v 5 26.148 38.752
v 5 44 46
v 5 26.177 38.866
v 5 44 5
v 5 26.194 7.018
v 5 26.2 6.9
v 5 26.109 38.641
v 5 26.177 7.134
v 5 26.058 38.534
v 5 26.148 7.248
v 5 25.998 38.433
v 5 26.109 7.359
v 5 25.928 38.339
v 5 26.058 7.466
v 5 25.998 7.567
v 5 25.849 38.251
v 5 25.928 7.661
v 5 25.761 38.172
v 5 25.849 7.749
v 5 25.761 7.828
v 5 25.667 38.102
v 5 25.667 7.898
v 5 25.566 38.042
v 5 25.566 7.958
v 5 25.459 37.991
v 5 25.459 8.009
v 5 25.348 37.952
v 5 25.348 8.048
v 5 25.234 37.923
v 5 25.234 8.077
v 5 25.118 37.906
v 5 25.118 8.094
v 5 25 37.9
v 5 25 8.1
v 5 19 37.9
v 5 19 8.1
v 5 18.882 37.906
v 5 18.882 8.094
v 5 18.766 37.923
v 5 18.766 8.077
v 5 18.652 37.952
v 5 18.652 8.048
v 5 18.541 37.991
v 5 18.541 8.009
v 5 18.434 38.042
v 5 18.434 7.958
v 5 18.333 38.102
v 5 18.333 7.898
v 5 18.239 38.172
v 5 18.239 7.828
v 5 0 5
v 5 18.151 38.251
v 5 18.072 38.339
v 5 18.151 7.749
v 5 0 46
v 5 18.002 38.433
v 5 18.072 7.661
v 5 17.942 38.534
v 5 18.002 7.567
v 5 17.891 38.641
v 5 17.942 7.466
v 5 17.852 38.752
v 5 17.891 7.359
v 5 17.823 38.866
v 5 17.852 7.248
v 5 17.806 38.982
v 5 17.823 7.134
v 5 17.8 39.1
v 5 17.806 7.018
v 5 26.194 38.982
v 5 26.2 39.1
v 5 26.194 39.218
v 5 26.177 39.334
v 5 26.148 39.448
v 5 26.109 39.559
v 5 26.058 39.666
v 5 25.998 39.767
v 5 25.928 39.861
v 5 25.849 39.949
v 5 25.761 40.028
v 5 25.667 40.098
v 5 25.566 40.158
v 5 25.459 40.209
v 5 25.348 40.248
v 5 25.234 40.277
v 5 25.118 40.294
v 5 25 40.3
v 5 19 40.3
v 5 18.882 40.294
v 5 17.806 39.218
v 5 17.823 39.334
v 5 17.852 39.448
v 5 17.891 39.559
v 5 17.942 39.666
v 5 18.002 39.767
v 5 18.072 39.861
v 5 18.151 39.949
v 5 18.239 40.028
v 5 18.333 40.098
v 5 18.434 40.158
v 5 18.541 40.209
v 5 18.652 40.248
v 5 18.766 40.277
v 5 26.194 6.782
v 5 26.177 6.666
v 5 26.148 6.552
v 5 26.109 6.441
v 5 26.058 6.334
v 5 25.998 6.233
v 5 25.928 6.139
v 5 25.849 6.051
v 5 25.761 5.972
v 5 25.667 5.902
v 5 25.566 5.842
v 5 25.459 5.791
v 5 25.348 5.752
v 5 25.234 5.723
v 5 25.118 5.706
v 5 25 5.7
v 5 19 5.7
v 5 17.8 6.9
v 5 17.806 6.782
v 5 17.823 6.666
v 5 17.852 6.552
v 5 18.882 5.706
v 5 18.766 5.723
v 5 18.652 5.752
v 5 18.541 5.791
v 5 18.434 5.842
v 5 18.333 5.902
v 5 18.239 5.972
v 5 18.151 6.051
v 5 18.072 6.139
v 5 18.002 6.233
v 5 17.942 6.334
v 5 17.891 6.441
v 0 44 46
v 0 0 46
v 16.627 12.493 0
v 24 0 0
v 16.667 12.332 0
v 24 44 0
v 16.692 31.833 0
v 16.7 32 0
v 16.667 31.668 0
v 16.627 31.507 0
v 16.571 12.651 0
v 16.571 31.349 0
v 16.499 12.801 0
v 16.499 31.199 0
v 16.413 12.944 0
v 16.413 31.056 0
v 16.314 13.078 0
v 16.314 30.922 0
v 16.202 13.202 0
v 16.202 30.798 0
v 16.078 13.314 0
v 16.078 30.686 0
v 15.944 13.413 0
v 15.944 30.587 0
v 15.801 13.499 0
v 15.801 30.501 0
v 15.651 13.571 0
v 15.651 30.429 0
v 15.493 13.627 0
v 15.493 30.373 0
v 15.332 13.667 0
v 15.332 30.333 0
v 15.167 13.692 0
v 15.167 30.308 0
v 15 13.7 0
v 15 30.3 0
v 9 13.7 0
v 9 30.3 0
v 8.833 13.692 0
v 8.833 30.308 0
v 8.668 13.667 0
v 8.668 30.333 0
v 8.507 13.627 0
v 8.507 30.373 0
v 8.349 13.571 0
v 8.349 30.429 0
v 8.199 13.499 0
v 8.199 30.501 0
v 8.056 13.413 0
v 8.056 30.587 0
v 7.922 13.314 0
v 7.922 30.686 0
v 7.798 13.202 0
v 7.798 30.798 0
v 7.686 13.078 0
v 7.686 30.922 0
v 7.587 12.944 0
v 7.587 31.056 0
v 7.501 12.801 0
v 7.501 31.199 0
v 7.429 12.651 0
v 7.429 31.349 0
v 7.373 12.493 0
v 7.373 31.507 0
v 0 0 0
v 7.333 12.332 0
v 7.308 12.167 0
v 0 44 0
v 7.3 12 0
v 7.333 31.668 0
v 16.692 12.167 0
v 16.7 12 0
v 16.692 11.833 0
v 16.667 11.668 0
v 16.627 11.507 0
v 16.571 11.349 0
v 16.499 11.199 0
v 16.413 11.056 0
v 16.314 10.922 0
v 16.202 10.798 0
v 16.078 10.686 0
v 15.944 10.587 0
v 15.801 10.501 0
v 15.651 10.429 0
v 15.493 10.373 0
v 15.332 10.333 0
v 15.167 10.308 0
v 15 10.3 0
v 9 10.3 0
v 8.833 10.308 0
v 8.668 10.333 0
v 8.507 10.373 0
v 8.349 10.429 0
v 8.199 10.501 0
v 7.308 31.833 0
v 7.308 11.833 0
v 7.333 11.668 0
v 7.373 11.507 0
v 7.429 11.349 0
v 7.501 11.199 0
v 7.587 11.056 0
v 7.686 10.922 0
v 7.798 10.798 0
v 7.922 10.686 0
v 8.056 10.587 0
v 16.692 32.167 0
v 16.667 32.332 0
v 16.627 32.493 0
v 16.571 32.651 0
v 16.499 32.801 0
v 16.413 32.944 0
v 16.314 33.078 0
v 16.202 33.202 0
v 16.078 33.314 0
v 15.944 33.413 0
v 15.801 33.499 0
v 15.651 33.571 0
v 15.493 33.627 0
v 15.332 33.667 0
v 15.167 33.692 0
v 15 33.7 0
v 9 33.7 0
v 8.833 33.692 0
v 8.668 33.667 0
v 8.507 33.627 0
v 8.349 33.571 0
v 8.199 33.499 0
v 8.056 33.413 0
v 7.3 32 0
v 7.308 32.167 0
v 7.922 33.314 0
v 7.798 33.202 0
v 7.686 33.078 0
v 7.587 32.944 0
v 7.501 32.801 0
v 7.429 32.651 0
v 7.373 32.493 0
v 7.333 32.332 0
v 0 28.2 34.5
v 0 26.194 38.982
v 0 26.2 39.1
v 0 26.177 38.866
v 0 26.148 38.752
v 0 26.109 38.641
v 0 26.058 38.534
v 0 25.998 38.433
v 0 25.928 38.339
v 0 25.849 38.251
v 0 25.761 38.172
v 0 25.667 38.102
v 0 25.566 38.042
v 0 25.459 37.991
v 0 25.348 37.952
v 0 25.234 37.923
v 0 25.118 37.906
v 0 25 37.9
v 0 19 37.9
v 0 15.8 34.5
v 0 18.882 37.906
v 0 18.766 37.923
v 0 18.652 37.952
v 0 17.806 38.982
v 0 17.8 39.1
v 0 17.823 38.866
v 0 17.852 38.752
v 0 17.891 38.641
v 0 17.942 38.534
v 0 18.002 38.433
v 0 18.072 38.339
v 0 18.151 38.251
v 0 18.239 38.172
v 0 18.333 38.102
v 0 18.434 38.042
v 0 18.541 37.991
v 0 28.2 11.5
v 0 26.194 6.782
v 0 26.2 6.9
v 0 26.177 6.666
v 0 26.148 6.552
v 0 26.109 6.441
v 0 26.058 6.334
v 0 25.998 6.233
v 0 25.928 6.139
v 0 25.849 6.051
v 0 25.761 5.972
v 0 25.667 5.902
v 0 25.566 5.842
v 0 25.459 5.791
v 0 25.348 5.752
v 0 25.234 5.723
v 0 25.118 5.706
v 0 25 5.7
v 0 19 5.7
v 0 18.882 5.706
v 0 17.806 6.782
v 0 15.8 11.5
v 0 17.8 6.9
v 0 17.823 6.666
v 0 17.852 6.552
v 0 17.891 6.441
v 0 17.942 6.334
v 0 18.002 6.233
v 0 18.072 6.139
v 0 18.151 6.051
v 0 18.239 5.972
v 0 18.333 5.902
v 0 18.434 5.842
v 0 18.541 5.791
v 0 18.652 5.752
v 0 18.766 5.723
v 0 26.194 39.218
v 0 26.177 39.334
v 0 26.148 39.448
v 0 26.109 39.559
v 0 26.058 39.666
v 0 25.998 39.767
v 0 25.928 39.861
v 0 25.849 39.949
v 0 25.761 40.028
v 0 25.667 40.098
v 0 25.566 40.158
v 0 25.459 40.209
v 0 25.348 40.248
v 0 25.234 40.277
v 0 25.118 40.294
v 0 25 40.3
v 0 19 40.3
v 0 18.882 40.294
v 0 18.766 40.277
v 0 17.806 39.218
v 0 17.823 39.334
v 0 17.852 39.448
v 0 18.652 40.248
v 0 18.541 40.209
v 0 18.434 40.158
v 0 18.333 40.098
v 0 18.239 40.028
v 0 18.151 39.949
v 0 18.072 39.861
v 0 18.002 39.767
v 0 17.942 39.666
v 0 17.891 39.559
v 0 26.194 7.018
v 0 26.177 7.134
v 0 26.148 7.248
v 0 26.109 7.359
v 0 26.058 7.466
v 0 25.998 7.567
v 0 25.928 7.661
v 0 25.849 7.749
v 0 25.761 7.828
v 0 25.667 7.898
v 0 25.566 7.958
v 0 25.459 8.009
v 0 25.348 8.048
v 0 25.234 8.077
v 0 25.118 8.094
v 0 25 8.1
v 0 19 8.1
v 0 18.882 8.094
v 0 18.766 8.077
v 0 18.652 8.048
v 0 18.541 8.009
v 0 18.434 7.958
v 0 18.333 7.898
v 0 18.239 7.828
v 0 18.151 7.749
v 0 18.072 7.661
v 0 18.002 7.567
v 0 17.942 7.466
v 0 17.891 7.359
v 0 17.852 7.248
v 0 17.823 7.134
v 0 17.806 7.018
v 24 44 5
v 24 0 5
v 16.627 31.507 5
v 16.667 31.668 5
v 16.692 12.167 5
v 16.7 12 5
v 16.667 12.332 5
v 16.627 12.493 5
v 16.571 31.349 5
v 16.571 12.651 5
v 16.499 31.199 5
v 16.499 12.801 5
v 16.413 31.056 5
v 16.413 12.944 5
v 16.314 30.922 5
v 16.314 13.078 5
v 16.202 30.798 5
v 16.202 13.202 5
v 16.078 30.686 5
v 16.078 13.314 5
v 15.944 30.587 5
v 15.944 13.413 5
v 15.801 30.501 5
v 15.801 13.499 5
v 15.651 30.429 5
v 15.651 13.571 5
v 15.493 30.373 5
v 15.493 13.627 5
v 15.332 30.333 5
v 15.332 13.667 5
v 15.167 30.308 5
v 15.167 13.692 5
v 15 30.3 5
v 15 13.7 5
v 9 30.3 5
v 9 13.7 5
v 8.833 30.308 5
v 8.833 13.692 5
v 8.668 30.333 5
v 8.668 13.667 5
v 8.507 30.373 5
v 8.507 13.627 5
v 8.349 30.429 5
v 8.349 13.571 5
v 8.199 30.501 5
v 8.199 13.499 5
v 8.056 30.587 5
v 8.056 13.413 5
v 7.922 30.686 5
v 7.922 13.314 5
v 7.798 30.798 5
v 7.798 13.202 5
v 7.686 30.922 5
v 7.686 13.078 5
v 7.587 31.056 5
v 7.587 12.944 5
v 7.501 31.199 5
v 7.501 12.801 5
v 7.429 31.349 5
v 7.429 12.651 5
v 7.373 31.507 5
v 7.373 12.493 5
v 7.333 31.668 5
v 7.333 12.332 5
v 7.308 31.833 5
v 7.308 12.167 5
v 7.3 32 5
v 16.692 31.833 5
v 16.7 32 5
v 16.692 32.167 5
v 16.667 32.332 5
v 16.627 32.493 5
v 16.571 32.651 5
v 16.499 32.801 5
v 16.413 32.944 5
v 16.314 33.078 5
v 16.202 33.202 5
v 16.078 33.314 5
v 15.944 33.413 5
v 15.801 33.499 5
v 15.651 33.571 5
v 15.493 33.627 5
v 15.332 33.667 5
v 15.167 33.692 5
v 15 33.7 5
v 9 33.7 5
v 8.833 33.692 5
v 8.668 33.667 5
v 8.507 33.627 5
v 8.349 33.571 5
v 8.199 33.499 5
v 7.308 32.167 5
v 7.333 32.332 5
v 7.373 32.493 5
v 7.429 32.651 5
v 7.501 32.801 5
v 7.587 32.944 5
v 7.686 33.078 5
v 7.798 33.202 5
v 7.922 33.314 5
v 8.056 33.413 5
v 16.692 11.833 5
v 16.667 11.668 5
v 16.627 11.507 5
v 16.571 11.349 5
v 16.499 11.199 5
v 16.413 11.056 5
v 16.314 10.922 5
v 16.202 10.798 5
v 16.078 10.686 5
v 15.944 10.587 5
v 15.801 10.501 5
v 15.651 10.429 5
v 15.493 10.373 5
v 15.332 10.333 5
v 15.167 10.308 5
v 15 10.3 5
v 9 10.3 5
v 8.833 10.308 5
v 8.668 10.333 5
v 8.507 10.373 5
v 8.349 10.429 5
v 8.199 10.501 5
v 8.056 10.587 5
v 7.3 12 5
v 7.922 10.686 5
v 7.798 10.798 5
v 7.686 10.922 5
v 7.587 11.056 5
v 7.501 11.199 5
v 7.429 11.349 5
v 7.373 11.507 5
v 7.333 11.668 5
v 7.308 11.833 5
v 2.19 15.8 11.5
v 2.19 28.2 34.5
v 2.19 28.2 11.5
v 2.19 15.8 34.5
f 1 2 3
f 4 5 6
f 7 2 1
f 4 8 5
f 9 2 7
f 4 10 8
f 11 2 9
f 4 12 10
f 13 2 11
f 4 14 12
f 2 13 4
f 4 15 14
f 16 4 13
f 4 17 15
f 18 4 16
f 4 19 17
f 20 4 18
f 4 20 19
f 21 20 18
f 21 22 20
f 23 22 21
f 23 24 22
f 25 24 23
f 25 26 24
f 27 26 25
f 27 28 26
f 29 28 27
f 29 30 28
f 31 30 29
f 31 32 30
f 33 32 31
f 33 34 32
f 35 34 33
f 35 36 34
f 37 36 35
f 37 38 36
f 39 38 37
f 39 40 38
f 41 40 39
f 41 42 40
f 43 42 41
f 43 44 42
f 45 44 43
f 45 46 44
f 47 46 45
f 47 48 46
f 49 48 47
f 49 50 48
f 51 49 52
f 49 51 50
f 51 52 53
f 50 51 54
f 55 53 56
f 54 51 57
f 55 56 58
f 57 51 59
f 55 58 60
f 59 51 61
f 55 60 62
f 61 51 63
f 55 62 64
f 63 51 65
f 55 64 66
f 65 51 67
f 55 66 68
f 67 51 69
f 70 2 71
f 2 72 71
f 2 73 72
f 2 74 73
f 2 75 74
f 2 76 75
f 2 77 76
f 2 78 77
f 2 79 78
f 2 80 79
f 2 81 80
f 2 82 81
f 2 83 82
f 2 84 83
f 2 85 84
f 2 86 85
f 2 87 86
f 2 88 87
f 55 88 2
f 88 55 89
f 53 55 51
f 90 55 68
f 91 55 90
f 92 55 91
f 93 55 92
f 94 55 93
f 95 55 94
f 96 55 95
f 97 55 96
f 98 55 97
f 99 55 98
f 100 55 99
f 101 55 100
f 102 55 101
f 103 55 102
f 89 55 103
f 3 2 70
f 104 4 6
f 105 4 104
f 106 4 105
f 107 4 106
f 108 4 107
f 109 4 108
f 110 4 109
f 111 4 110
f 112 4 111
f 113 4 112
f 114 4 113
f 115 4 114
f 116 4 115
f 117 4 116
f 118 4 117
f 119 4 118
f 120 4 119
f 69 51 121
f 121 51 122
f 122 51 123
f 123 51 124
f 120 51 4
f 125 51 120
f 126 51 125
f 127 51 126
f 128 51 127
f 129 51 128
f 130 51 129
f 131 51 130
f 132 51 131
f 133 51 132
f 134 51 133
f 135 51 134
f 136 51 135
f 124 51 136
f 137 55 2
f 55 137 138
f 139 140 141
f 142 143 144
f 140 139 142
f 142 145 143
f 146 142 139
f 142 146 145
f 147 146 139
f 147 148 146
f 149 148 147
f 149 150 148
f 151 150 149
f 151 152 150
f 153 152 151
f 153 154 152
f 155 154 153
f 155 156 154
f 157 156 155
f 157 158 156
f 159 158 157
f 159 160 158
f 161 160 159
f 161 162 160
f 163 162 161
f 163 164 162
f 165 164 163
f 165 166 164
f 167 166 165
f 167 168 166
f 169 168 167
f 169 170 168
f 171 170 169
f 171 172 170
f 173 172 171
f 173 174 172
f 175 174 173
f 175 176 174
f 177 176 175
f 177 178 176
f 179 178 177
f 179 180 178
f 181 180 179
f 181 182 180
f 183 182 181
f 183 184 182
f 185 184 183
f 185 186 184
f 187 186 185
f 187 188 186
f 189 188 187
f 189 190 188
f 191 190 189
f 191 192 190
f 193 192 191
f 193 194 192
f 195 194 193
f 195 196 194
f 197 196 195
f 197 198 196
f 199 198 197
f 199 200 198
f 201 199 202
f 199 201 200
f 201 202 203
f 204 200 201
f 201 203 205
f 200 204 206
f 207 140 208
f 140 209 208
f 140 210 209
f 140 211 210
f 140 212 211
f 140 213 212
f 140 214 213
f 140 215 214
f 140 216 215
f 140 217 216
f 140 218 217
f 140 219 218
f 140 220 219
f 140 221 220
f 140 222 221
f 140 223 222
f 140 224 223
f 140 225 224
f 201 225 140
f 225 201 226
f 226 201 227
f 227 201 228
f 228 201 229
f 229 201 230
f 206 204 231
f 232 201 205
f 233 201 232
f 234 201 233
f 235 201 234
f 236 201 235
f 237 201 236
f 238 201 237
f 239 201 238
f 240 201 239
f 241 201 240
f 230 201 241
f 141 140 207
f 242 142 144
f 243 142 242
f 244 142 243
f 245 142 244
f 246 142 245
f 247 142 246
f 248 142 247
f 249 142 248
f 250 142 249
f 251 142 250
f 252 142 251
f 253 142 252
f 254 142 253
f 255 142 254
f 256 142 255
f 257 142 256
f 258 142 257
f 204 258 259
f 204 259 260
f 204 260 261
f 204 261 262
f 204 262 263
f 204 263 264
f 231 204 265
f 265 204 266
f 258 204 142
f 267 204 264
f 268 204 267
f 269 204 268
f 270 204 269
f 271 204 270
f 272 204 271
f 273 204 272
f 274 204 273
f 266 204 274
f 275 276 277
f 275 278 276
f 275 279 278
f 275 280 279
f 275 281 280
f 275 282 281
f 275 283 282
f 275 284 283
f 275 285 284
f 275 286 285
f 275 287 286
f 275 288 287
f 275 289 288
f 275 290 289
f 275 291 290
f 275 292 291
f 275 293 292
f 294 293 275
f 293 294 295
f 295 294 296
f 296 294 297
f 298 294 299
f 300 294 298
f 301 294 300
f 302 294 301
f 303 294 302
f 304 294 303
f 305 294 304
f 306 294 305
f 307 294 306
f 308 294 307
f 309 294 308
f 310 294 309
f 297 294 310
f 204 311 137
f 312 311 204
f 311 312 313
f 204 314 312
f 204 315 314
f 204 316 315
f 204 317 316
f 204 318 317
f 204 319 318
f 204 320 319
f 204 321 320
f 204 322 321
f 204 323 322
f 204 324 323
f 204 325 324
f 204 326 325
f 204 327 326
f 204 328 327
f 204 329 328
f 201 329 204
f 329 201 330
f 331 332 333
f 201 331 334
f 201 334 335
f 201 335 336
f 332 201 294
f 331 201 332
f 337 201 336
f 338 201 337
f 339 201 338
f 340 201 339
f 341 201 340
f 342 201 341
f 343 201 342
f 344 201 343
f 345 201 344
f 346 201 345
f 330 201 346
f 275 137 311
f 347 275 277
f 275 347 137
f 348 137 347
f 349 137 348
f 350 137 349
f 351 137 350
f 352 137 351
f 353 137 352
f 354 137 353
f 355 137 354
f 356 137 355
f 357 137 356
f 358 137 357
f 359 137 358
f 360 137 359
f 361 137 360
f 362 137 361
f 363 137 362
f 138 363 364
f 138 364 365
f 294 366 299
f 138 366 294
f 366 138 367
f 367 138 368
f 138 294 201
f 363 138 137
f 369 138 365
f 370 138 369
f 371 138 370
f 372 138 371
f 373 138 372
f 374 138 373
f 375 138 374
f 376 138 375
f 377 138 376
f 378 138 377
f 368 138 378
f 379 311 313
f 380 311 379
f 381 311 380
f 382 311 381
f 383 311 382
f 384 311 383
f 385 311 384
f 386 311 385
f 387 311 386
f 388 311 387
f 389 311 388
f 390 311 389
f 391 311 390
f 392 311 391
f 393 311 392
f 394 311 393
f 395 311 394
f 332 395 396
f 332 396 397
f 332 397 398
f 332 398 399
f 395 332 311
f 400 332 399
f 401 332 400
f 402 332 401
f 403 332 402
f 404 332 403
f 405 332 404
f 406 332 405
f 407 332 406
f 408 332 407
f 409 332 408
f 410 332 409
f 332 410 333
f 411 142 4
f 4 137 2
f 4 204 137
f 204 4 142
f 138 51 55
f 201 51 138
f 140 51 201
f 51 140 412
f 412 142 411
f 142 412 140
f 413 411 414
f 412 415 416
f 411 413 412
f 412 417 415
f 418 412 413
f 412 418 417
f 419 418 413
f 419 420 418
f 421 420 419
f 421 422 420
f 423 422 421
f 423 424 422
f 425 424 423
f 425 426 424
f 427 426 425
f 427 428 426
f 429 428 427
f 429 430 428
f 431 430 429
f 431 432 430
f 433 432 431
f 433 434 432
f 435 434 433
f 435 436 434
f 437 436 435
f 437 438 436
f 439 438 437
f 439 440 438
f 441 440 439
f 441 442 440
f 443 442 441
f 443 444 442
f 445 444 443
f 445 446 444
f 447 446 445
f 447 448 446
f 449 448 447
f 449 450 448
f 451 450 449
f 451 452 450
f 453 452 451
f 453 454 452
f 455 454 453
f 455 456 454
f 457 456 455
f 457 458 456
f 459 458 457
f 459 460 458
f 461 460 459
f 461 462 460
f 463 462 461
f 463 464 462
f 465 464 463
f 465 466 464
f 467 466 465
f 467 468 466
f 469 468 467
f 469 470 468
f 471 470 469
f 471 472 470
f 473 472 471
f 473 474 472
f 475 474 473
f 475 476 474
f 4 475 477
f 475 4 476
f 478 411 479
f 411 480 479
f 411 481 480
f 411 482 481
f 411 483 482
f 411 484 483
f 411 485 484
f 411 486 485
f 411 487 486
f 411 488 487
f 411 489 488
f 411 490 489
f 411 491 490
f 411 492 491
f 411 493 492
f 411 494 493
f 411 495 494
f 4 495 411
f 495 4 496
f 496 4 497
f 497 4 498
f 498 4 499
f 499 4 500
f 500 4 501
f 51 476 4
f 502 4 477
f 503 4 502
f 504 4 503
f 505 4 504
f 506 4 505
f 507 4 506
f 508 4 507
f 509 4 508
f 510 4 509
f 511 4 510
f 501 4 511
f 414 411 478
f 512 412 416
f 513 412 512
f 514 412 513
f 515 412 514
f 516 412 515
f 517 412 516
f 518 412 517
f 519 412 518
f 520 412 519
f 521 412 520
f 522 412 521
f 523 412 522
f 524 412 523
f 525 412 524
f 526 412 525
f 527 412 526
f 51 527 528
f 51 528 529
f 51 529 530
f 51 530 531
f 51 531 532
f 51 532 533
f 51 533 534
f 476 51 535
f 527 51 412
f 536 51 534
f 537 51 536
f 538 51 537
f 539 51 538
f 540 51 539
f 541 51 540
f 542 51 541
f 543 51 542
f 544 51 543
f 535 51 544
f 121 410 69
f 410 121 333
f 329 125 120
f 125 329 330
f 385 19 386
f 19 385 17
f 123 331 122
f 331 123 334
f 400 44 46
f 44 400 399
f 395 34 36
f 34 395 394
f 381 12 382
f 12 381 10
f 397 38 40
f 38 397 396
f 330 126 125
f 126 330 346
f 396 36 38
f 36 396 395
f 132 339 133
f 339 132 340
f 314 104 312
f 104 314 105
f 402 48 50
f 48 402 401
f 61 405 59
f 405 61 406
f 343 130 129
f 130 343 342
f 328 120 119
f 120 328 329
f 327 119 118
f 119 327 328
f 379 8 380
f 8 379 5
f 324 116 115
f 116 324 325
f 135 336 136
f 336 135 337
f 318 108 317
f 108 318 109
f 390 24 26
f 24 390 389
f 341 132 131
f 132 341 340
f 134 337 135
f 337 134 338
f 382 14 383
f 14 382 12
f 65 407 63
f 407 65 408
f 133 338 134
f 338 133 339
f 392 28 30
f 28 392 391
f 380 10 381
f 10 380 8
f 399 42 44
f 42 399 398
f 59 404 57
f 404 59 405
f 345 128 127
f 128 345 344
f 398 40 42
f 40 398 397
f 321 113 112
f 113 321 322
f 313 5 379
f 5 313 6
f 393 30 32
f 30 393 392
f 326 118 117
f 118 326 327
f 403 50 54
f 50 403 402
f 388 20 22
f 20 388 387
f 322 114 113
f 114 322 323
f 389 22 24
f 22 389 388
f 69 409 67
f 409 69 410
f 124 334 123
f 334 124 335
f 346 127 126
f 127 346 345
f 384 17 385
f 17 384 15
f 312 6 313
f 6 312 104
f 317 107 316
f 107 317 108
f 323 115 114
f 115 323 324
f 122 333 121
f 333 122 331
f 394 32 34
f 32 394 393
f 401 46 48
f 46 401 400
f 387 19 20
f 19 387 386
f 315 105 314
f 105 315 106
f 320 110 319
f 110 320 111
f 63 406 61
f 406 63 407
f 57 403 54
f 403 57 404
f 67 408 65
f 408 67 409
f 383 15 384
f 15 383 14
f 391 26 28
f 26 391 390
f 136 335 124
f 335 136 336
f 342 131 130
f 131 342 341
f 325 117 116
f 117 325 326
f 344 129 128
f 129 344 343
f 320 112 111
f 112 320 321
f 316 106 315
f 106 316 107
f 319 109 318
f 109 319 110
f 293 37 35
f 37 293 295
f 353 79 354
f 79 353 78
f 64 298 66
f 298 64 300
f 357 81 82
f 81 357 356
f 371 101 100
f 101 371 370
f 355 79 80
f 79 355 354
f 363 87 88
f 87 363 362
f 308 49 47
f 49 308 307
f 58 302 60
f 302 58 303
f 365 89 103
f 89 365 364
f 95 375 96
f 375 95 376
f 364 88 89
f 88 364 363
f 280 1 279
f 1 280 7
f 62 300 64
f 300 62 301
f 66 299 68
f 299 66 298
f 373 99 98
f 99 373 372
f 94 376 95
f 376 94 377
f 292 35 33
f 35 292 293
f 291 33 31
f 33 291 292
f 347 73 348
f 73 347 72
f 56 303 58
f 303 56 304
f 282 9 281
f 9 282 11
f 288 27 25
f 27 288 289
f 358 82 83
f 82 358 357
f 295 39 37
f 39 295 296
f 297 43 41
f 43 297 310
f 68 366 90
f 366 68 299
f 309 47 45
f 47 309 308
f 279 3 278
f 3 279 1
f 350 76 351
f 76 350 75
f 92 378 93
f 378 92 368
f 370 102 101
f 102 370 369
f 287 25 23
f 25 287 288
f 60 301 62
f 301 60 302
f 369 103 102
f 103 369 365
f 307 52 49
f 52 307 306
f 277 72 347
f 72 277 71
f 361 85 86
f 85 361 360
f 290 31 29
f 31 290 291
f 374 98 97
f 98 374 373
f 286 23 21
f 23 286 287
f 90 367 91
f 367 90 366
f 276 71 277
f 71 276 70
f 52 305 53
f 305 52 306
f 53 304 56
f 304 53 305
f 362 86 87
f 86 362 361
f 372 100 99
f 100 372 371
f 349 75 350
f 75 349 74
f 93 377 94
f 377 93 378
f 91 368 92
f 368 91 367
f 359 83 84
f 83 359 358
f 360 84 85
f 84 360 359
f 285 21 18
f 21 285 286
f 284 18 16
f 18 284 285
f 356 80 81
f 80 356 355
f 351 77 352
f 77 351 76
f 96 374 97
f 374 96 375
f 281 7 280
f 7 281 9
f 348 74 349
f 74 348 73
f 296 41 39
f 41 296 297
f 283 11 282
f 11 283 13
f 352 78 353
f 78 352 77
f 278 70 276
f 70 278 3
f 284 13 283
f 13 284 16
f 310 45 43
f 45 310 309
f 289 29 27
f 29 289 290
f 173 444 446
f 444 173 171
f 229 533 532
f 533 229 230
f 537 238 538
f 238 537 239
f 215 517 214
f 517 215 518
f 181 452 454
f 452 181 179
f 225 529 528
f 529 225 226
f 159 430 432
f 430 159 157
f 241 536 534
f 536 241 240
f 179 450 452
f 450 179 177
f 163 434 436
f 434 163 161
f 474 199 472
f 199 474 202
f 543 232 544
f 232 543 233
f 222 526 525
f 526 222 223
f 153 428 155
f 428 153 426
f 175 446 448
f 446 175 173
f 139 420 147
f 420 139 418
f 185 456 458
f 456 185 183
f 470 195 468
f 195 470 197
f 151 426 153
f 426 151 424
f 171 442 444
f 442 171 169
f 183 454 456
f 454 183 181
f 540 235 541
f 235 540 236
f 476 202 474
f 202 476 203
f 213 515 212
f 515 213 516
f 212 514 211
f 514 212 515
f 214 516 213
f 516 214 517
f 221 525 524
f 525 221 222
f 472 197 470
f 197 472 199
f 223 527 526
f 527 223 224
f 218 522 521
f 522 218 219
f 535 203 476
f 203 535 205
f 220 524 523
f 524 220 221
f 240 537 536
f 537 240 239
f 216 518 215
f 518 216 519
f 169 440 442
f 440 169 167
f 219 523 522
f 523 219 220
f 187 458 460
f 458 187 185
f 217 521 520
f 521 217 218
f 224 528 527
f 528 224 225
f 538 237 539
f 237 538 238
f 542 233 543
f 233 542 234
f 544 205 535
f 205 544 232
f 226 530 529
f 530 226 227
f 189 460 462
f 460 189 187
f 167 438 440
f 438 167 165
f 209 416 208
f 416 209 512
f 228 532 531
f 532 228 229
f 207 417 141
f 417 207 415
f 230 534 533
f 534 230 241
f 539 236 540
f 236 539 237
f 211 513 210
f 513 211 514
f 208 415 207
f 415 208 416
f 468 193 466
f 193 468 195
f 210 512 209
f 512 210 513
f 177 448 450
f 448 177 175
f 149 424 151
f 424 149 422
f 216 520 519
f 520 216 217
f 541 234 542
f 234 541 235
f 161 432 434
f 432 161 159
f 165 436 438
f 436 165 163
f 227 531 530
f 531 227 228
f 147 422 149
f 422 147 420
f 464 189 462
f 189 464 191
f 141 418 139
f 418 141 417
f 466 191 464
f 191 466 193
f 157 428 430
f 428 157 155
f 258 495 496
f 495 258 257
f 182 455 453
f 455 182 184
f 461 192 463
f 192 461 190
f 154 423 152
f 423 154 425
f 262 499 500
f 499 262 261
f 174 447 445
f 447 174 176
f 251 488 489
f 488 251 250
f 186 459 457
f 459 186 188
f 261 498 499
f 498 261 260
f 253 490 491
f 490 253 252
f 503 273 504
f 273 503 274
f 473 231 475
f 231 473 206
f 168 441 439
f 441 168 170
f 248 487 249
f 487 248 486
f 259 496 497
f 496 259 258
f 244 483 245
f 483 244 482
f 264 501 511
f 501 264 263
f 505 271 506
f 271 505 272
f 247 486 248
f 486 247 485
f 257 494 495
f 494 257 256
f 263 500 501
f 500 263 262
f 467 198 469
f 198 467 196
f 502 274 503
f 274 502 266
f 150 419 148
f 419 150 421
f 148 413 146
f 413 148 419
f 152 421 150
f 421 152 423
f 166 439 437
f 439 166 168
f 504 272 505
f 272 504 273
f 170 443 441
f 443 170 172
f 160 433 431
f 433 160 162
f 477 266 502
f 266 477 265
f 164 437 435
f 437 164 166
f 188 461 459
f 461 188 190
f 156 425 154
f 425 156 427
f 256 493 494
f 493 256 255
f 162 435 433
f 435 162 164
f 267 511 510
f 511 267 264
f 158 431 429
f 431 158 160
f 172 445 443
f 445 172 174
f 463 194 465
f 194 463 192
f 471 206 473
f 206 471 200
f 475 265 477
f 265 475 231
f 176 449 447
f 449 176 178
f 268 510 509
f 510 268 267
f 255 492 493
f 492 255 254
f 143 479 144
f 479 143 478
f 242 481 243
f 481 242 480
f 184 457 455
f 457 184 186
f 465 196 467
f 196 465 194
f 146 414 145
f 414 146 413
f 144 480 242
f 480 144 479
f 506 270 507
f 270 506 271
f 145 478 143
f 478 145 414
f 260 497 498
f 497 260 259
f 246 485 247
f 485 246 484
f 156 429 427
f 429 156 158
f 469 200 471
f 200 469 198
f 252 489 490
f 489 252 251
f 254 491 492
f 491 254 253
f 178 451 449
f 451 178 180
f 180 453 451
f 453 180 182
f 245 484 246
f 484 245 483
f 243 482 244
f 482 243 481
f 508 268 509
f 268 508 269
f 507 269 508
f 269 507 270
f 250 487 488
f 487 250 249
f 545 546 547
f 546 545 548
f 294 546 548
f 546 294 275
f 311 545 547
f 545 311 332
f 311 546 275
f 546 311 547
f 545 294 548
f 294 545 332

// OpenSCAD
// file: params.scad
// ArtBot - shared parameters for all printed parts. Units: mm.
// Anything tagged VERIFY must be measured against the parts actually ordered
// before you burn filament on a full set.

$fn = 64;
eps = 0.01;

/* ---------- fasteners (clearance holes, not tapped) ---------- */
m2_clear   = 2.4;
m3_clear   = 3.4;
m3_nut_af  = 5.6;   // across flats
m3_nut_t   = 2.6;
m5_clear   = 5.4;
m5_head_d  = 9.6;
m5_head_h  = 5.2;

/* ---------- V-slot extrusion ---------- */
vslot      = 20;    // 2020 face width
vslot_2040 = 40;    // 2040 long face

/* ---------- gantry plate bolt grid ----------
   OpenBuilds Mini-V / Xtreme plates all use a 20 mm M5 grid.
   VERIFY the actual hole positions on the plate you buy - vendors differ
   on WHICH grid holes are present, not on the pitch.                      */
plate_grid = 20;

/* ---------- GT2 belt ---------- */
belt_w      = 6;
belt_pitch  = 2;
belt_back   = 0.80;  // thickness behind the teeth
belt_tooth  = 0.75;  // tooth depth

/* ---------- pen shuttle guide rods ---------- */
rod_d       = 8;
rod_press   = 7.85;  // interference fit in the fixed walls (tune per printer)
rod_slide   = 8.5;   // running clearance in the moving shuttle
rod_spacing = 40;    // centre-to-centre, horizontal
rod_len     = 74;    // cut length. base plate + span + front wall

/* ---------- whiteboard marker ---------- */
pen_d       = 17;    // VERIFY: calliper the barrel of the marker you'll use
pen_clear_d = 24;    // pass-through in the front wall

/* ---------- SG90 servo ----------
   Mount holes are SLOTTED in servo_bracket_sg90.scad on purpose: SG90 clones
   vary by ~1 mm and the throw needs fore/aft trimming at assembly anyway.   */
sg90_len     = 23.0;
sg90_wid     = 12.4;
sg90_hgt     = 22.6;
sg90_tab_span = 32.2;  // screw centre to screw centre
sg90_tab_t    = 2.6;
sg90_screw_d  = 2.4;

/* ---------- limit switch (V-153 / KW12 style lever microswitch) ---------- */
sw_hole_pitch = 9.5;  // VERIFY against your switch
sw_hole_d     = 2.6;
// main file
// ArtBot - SG90 servo bracket. Qty 1.
// Bolts to the LEFT rib of pen_carriage_base. Slotted holes on both
// interfaces: the servo throw needs trimming at assembly, always.
include <params.scad>

br_l   = 46;   // along Z (fore/aft, toward the board)
br_h   = 44;   // along Y
br_t   = 5;
wing_l = 24;

module slot(len, d, h) {
    hull() for (o = [-len/2, len/2]) translate([o, 0, 0]) cylinder(d = d, h = h);
}

difference() {
    union() {
        // vertical face: carries the servo
        cube([br_t, br_h, br_l], center = false);
        // foot: bolts to the carriage rib
        cube([wing_l, br_h, br_t]);
    }

    // servo mount tabs -> slotted along Z for throw adjustment
    for (z = [br_l/2 - sg90_tab_span/2, br_l/2 + sg90_tab_span/2])
        translate([-eps, br_h/2, z]) rotate([0, 90, 0])
            rotate([0, 0, 90]) slot(6, sg90_screw_d, br_t + 2*eps);

    // servo body pocket so the case sits flush against the face
    translate([-eps, br_h/2 - sg90_wid/2, br_l/2 - sg90_len/2])
        cube([2.2, sg90_wid, sg90_len]);

    // foot -> 2x M3 slotted along X, matches the rib bosses at 20 mm pitch
    for (y = [br_h/2 - 10, br_h/2 + 10])
        translate([wing_l/2, y, -eps]) slot(6, m3_clear, br_t + 2*eps);
}

// PRINT: foot down, 4 perimeters, 40% infill, no supports.
